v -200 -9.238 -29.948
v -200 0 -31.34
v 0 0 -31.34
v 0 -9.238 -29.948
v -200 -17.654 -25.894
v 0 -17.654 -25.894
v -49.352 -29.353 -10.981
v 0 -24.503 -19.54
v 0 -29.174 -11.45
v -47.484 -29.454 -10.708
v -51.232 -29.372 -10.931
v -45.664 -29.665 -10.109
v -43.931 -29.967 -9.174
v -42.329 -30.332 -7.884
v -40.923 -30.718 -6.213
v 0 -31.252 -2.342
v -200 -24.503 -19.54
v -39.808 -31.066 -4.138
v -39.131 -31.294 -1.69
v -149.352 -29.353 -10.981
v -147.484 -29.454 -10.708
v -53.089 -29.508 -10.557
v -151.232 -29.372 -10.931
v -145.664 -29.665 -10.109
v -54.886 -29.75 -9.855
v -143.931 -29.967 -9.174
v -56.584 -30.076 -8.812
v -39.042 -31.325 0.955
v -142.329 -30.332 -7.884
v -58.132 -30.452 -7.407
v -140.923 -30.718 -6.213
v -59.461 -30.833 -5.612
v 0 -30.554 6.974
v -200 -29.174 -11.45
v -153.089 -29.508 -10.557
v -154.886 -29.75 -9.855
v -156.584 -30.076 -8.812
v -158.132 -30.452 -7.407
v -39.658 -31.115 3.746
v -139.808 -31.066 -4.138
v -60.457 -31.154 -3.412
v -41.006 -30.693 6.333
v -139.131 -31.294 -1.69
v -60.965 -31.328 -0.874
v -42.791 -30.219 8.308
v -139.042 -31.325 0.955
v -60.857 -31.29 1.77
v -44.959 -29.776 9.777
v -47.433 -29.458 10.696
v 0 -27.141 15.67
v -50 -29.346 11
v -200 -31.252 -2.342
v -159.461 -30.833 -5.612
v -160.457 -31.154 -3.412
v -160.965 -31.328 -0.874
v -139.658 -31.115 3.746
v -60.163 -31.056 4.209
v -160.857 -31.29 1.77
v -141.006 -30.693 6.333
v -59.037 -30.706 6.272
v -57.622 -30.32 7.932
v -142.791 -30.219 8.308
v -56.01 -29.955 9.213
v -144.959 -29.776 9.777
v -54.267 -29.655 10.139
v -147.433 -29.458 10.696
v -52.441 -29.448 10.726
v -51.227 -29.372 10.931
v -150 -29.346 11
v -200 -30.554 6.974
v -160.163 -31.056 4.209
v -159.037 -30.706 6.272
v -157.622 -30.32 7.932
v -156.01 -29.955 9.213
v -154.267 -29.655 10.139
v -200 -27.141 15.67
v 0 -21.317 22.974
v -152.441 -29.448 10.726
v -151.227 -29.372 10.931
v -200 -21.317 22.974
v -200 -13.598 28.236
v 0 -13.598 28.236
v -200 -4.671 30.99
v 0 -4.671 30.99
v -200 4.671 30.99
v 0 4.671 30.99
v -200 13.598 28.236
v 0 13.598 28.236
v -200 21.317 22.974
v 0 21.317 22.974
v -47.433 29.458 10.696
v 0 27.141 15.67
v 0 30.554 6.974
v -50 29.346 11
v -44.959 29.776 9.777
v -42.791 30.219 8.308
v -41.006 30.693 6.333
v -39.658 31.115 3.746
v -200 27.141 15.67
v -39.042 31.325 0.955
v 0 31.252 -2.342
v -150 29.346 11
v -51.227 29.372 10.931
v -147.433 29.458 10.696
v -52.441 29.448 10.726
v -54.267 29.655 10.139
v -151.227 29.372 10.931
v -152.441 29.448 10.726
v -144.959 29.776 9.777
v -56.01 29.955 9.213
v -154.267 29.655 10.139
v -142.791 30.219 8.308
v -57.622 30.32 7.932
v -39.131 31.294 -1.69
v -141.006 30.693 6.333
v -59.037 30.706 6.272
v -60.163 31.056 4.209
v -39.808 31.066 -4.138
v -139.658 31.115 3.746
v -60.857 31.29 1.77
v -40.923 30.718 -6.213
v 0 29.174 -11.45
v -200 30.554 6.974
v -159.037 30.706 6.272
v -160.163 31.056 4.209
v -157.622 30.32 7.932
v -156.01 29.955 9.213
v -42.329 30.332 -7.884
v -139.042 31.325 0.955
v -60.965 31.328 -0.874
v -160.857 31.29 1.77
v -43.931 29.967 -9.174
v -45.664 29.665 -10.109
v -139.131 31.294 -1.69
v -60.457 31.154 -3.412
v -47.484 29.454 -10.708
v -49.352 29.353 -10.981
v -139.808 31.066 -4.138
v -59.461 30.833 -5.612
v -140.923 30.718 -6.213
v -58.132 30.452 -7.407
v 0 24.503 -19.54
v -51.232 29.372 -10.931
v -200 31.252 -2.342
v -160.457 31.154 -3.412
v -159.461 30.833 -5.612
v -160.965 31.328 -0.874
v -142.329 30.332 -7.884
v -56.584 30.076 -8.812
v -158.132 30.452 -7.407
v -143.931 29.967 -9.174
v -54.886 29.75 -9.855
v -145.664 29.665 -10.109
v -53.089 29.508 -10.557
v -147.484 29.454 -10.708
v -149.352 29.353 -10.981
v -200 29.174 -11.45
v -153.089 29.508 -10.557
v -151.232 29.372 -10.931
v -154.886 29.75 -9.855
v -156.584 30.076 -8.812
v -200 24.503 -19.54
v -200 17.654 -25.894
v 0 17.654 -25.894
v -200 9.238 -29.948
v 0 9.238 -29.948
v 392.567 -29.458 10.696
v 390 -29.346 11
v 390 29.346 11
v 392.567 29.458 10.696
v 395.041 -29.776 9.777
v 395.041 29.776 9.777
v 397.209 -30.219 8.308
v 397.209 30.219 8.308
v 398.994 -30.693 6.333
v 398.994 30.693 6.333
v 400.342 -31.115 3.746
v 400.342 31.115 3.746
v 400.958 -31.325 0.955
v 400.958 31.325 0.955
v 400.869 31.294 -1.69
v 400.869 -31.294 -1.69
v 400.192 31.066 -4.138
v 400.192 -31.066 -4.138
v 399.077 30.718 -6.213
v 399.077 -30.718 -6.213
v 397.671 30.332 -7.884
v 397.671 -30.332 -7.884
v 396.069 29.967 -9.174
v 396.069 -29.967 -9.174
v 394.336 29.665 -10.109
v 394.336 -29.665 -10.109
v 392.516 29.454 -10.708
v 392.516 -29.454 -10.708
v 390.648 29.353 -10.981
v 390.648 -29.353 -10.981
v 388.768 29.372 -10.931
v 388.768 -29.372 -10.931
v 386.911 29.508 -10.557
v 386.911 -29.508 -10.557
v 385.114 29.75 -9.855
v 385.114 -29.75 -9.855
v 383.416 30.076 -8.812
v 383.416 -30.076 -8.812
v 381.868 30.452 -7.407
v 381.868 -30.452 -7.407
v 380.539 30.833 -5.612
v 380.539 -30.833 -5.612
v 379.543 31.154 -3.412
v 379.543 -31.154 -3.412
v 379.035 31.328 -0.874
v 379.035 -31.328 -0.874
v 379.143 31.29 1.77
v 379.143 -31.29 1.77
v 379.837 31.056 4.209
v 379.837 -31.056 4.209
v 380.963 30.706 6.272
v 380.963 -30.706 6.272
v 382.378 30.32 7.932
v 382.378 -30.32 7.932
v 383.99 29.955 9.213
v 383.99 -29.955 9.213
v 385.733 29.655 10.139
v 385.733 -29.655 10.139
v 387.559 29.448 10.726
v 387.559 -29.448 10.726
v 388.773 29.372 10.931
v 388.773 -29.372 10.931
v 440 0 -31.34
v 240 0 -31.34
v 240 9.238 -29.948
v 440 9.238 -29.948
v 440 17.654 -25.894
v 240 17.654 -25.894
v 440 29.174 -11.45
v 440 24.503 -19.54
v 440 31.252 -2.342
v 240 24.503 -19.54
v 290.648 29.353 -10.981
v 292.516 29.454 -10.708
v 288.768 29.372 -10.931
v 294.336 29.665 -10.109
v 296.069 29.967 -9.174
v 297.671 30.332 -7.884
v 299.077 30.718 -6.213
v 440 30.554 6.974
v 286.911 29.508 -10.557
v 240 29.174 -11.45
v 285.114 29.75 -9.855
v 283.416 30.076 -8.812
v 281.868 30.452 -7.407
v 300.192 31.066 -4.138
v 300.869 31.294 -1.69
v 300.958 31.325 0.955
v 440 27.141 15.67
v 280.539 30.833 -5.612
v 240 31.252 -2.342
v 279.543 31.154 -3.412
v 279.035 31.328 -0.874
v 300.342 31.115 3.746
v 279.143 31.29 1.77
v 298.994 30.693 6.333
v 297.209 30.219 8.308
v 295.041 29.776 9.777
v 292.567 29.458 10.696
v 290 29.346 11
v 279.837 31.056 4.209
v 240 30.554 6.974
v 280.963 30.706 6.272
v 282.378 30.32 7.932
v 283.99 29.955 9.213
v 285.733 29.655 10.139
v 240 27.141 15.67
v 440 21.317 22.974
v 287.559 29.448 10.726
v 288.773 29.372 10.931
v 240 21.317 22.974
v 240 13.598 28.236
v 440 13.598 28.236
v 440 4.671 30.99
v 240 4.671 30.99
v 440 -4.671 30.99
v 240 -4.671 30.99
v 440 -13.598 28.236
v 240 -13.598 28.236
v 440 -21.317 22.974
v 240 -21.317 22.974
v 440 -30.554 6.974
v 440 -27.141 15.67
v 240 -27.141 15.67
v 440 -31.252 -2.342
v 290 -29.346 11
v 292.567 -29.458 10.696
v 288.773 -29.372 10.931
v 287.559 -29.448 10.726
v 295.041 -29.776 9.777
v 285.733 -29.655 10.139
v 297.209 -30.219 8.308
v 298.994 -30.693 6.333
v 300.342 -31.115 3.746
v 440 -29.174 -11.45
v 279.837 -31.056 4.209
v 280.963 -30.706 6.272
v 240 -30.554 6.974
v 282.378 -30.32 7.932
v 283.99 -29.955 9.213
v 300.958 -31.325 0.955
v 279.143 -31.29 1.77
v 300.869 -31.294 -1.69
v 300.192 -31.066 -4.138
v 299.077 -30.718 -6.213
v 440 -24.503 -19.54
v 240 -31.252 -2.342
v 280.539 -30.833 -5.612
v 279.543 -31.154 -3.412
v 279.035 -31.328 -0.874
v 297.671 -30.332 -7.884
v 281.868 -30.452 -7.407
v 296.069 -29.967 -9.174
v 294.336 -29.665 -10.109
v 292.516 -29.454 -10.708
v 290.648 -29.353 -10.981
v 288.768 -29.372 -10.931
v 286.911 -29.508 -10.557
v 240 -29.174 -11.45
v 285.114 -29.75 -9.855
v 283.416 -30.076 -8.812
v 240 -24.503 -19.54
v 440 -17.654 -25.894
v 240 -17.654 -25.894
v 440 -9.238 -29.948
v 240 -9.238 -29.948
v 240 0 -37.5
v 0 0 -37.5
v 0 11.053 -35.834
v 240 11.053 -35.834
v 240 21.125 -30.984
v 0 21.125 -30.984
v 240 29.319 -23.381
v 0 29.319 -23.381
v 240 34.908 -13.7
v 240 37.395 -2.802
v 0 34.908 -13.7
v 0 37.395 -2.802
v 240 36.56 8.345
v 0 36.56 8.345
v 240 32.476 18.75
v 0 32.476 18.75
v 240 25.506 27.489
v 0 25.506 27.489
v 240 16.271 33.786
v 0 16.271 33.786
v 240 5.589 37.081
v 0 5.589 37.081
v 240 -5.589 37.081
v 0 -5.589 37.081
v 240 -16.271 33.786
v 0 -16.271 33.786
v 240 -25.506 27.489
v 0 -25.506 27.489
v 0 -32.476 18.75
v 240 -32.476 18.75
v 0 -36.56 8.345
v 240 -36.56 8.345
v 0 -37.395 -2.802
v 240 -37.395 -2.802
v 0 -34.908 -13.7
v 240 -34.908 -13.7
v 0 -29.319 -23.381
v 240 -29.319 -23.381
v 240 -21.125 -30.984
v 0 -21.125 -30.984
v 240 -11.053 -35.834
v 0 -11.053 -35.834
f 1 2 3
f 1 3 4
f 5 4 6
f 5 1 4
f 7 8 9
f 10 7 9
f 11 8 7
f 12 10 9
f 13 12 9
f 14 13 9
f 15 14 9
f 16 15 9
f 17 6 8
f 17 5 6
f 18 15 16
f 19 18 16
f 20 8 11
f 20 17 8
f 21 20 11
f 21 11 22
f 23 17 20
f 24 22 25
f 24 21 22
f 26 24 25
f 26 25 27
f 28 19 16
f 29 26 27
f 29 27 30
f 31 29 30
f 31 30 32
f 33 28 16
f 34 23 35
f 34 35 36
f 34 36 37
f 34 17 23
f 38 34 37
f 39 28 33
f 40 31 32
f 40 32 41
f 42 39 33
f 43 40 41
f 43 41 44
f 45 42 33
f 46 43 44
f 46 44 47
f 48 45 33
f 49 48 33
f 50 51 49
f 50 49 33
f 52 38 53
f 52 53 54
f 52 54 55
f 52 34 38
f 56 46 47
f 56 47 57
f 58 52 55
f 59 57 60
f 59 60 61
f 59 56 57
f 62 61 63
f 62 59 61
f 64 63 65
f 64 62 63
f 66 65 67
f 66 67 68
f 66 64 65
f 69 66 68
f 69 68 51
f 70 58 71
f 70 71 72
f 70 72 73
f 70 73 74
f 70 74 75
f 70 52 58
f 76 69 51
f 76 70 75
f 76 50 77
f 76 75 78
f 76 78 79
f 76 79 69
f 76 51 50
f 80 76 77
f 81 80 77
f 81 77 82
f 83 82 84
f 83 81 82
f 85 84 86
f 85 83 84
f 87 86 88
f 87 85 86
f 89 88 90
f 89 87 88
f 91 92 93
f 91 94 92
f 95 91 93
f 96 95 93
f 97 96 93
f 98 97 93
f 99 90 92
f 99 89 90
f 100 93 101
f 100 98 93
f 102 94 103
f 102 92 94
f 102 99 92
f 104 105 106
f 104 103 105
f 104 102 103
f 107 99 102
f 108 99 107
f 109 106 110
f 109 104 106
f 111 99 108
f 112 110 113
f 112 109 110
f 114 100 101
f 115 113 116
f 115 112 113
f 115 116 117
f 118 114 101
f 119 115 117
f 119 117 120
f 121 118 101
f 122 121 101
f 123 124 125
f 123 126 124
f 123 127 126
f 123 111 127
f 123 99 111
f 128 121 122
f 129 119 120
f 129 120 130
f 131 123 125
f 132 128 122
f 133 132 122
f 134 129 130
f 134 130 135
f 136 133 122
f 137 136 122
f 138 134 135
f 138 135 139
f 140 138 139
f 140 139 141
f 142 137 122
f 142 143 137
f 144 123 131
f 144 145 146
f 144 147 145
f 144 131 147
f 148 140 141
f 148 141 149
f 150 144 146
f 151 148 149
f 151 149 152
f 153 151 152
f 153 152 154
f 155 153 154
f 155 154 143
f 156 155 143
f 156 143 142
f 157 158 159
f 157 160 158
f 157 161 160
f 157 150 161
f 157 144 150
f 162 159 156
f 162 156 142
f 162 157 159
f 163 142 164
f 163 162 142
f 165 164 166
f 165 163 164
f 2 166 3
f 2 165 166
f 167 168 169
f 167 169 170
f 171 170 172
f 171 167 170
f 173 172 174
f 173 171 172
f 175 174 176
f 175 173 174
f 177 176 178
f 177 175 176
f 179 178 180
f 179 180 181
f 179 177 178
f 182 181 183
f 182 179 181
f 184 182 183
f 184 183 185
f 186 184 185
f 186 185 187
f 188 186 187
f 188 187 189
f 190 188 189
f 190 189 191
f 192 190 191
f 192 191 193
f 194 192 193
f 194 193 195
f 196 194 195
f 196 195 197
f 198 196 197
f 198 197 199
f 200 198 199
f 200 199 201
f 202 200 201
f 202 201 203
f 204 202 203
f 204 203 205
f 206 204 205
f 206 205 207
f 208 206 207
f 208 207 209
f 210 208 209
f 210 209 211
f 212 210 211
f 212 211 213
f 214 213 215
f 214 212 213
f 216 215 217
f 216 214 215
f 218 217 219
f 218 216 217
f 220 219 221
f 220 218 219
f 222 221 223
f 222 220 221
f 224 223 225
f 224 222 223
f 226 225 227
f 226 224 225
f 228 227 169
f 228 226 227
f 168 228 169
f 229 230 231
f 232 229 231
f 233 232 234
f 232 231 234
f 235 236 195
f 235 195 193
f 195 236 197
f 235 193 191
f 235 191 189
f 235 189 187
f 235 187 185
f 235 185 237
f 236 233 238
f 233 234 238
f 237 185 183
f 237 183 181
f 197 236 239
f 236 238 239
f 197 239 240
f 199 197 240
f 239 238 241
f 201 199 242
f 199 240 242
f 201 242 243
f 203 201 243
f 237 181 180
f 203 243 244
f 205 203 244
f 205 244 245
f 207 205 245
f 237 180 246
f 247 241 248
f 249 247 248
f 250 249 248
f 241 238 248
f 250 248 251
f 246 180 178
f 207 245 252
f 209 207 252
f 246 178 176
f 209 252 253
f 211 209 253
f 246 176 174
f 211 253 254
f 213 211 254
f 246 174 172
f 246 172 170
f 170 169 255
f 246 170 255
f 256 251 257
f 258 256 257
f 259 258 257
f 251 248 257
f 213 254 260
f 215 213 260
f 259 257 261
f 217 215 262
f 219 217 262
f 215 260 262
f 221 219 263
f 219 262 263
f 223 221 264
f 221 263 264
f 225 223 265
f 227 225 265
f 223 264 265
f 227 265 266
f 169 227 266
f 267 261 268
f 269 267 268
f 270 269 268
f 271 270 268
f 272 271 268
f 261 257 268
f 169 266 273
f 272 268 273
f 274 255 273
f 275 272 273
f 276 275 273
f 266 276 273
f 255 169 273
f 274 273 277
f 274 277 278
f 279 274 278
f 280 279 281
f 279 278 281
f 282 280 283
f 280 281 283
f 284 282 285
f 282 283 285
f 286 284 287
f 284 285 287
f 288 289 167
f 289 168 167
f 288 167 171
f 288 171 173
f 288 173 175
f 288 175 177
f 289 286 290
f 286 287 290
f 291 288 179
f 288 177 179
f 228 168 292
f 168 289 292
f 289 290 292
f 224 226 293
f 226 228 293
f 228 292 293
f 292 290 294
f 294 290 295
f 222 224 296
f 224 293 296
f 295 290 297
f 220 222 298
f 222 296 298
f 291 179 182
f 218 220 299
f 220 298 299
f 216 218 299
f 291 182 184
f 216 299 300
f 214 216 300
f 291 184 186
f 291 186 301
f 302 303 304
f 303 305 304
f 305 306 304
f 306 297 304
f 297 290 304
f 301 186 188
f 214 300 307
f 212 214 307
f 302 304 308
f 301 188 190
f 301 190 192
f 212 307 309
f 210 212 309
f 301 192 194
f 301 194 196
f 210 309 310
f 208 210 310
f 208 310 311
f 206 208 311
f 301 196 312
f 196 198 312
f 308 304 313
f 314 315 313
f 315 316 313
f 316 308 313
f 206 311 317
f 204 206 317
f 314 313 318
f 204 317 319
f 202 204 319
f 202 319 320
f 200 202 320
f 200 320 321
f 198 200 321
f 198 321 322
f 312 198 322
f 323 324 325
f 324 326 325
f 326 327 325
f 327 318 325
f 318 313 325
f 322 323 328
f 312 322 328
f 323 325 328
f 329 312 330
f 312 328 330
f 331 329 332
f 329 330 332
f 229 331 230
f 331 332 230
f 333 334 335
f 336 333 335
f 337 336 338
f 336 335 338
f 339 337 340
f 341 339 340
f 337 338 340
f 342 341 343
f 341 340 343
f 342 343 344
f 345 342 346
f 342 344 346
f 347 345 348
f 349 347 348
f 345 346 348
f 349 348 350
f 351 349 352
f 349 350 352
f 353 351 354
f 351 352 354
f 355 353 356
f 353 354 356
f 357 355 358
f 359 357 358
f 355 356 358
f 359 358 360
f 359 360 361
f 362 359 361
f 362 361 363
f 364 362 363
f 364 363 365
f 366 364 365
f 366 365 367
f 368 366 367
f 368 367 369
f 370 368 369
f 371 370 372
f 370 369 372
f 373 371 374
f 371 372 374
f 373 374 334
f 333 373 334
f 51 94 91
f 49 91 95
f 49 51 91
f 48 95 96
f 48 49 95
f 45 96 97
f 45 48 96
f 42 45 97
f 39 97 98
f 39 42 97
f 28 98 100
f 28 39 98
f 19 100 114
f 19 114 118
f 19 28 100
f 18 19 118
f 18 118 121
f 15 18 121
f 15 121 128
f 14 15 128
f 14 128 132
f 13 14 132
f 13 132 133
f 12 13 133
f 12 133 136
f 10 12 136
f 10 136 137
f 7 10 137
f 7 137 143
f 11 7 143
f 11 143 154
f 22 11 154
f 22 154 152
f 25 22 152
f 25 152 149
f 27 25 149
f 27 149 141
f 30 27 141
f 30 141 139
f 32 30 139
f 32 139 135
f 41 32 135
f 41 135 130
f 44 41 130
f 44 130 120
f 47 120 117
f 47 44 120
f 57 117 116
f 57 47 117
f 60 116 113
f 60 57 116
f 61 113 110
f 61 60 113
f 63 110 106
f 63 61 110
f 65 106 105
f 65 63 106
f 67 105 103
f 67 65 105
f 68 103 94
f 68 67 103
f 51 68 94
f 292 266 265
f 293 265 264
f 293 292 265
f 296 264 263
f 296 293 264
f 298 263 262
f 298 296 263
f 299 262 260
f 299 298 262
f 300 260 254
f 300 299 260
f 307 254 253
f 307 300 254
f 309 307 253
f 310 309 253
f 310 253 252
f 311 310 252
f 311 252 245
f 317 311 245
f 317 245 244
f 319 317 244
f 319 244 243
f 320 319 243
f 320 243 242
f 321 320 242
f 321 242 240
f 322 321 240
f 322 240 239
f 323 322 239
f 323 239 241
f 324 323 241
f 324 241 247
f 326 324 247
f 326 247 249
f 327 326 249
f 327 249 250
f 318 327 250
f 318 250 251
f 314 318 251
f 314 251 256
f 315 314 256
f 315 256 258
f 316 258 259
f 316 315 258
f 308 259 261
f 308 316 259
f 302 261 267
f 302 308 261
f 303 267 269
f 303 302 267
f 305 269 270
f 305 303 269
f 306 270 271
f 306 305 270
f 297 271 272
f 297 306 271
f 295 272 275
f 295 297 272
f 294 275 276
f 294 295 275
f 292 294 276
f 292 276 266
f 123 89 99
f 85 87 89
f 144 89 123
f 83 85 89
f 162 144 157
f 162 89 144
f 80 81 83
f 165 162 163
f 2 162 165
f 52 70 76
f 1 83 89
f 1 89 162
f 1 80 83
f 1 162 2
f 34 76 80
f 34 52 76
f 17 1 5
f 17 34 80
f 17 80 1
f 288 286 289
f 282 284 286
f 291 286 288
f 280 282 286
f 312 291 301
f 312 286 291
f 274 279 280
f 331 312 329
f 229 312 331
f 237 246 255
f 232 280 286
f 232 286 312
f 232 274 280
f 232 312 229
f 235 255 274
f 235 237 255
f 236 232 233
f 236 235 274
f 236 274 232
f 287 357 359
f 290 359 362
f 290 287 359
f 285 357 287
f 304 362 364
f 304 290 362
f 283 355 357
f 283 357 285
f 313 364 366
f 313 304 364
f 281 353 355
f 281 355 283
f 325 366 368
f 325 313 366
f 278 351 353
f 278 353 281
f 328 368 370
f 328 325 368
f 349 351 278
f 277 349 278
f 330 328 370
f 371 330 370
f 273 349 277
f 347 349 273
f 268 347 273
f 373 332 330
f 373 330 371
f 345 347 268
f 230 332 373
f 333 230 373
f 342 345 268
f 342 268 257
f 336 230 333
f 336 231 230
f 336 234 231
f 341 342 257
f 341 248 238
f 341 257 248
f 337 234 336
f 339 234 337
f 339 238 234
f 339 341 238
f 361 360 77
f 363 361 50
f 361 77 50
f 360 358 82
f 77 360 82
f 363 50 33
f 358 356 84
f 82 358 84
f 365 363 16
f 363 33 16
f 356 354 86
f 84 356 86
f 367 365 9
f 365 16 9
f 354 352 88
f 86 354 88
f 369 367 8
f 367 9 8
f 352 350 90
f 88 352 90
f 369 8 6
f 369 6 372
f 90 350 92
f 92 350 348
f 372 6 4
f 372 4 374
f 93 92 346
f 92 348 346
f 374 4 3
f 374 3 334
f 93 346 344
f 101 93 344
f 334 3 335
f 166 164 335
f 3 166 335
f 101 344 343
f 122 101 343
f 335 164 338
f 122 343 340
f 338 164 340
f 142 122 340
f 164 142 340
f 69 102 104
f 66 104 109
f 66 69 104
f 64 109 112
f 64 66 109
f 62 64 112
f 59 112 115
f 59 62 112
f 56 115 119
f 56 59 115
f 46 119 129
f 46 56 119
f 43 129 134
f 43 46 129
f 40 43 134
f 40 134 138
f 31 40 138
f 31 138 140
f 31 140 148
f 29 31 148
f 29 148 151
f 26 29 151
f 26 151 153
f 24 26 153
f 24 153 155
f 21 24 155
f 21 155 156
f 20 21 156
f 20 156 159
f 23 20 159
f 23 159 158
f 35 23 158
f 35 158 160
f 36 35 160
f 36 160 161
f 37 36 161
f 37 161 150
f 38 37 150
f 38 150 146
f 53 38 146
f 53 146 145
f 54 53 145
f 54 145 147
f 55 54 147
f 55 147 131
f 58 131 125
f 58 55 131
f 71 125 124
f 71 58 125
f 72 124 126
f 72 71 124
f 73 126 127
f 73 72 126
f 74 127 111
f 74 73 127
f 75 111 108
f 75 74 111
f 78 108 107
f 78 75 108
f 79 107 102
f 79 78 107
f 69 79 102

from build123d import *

# Parameters (mm, degrees)
SKETCH1_R               = 37.5
BOSS_EXTRUDE1_DEPTH     = 240
SKETCH2_R               = 31.34
BOSS_EXTRUDE2_DEPTH     = 200
BOSS_EXTRUDE3_START     = 200
SKETCH3_R               = 31.34
BOSS_EXTRUDE3_DEPTH     = 200
CUT_EXTRUDE1_DEPTH      = 444.184498826
CUT_EXTRUDE1_DEPTH_BACK = 444.184498826
SKETCH4_R               = 11


with BuildPart() as part:
    # Sketch1 → Boss-Extrude1 (new body)
    with BuildSketch(Plane(origin=(0, 0, 0), x_dir=(0, 0, -1), z_dir=(1, 0, 0))):
        Circle(SKETCH1_R)
    extrude(amount=BOSS_EXTRUDE1_DEPTH)

    # Sketch2 → Boss-Extrude2 (add)
    with BuildSketch(Plane(origin=(240, 0, 0), x_dir=(0, 0, -1), z_dir=(1, 0, 0))):
        Circle(SKETCH2_R)
    extrude(amount=BOSS_EXTRUDE2_DEPTH)

    # Sketch3 → Boss-Extrude3 (add)
    with BuildSketch(Plane.ZY.offset(BOSS_EXTRUDE3_START)):
        with Locations(Location((0, 0, 0), (0, 0, 180))):
            Circle(SKETCH3_R)
    extrude(amount=-BOSS_EXTRUDE3_DEPTH)

    # Sketch4 → Cut-Extrude1 (cut, two sides: drawn at the far end of the back side and taken through both)
    with BuildSketch(Plane(origin=(0, 0, 0), x_dir=(1, 0, 0), z_dir=(0, 1, 0)).offset(-CUT_EXTRUDE1_DEPTH_BACK)):
        with Locations(Location((-50, 0, 0), (0, 0, 270))):
            Circle(SKETCH4_R)
        with Locations(Location((-150, 0, 0), (0, 0, 270))):
            Circle(SKETCH4_R)
        with Locations(Location((290, 0, 0), (0, 0, 270))):
            Circle(SKETCH4_R)
        with Locations(Location((390, 0, 0), (0, 0, 270))):
            Circle(SKETCH4_R)
    extrude(amount=CUT_EXTRUDE1_DEPTH + CUT_EXTRUDE1_DEPTH_BACK, mode=Mode.SUBTRACT)


solid = part.part
